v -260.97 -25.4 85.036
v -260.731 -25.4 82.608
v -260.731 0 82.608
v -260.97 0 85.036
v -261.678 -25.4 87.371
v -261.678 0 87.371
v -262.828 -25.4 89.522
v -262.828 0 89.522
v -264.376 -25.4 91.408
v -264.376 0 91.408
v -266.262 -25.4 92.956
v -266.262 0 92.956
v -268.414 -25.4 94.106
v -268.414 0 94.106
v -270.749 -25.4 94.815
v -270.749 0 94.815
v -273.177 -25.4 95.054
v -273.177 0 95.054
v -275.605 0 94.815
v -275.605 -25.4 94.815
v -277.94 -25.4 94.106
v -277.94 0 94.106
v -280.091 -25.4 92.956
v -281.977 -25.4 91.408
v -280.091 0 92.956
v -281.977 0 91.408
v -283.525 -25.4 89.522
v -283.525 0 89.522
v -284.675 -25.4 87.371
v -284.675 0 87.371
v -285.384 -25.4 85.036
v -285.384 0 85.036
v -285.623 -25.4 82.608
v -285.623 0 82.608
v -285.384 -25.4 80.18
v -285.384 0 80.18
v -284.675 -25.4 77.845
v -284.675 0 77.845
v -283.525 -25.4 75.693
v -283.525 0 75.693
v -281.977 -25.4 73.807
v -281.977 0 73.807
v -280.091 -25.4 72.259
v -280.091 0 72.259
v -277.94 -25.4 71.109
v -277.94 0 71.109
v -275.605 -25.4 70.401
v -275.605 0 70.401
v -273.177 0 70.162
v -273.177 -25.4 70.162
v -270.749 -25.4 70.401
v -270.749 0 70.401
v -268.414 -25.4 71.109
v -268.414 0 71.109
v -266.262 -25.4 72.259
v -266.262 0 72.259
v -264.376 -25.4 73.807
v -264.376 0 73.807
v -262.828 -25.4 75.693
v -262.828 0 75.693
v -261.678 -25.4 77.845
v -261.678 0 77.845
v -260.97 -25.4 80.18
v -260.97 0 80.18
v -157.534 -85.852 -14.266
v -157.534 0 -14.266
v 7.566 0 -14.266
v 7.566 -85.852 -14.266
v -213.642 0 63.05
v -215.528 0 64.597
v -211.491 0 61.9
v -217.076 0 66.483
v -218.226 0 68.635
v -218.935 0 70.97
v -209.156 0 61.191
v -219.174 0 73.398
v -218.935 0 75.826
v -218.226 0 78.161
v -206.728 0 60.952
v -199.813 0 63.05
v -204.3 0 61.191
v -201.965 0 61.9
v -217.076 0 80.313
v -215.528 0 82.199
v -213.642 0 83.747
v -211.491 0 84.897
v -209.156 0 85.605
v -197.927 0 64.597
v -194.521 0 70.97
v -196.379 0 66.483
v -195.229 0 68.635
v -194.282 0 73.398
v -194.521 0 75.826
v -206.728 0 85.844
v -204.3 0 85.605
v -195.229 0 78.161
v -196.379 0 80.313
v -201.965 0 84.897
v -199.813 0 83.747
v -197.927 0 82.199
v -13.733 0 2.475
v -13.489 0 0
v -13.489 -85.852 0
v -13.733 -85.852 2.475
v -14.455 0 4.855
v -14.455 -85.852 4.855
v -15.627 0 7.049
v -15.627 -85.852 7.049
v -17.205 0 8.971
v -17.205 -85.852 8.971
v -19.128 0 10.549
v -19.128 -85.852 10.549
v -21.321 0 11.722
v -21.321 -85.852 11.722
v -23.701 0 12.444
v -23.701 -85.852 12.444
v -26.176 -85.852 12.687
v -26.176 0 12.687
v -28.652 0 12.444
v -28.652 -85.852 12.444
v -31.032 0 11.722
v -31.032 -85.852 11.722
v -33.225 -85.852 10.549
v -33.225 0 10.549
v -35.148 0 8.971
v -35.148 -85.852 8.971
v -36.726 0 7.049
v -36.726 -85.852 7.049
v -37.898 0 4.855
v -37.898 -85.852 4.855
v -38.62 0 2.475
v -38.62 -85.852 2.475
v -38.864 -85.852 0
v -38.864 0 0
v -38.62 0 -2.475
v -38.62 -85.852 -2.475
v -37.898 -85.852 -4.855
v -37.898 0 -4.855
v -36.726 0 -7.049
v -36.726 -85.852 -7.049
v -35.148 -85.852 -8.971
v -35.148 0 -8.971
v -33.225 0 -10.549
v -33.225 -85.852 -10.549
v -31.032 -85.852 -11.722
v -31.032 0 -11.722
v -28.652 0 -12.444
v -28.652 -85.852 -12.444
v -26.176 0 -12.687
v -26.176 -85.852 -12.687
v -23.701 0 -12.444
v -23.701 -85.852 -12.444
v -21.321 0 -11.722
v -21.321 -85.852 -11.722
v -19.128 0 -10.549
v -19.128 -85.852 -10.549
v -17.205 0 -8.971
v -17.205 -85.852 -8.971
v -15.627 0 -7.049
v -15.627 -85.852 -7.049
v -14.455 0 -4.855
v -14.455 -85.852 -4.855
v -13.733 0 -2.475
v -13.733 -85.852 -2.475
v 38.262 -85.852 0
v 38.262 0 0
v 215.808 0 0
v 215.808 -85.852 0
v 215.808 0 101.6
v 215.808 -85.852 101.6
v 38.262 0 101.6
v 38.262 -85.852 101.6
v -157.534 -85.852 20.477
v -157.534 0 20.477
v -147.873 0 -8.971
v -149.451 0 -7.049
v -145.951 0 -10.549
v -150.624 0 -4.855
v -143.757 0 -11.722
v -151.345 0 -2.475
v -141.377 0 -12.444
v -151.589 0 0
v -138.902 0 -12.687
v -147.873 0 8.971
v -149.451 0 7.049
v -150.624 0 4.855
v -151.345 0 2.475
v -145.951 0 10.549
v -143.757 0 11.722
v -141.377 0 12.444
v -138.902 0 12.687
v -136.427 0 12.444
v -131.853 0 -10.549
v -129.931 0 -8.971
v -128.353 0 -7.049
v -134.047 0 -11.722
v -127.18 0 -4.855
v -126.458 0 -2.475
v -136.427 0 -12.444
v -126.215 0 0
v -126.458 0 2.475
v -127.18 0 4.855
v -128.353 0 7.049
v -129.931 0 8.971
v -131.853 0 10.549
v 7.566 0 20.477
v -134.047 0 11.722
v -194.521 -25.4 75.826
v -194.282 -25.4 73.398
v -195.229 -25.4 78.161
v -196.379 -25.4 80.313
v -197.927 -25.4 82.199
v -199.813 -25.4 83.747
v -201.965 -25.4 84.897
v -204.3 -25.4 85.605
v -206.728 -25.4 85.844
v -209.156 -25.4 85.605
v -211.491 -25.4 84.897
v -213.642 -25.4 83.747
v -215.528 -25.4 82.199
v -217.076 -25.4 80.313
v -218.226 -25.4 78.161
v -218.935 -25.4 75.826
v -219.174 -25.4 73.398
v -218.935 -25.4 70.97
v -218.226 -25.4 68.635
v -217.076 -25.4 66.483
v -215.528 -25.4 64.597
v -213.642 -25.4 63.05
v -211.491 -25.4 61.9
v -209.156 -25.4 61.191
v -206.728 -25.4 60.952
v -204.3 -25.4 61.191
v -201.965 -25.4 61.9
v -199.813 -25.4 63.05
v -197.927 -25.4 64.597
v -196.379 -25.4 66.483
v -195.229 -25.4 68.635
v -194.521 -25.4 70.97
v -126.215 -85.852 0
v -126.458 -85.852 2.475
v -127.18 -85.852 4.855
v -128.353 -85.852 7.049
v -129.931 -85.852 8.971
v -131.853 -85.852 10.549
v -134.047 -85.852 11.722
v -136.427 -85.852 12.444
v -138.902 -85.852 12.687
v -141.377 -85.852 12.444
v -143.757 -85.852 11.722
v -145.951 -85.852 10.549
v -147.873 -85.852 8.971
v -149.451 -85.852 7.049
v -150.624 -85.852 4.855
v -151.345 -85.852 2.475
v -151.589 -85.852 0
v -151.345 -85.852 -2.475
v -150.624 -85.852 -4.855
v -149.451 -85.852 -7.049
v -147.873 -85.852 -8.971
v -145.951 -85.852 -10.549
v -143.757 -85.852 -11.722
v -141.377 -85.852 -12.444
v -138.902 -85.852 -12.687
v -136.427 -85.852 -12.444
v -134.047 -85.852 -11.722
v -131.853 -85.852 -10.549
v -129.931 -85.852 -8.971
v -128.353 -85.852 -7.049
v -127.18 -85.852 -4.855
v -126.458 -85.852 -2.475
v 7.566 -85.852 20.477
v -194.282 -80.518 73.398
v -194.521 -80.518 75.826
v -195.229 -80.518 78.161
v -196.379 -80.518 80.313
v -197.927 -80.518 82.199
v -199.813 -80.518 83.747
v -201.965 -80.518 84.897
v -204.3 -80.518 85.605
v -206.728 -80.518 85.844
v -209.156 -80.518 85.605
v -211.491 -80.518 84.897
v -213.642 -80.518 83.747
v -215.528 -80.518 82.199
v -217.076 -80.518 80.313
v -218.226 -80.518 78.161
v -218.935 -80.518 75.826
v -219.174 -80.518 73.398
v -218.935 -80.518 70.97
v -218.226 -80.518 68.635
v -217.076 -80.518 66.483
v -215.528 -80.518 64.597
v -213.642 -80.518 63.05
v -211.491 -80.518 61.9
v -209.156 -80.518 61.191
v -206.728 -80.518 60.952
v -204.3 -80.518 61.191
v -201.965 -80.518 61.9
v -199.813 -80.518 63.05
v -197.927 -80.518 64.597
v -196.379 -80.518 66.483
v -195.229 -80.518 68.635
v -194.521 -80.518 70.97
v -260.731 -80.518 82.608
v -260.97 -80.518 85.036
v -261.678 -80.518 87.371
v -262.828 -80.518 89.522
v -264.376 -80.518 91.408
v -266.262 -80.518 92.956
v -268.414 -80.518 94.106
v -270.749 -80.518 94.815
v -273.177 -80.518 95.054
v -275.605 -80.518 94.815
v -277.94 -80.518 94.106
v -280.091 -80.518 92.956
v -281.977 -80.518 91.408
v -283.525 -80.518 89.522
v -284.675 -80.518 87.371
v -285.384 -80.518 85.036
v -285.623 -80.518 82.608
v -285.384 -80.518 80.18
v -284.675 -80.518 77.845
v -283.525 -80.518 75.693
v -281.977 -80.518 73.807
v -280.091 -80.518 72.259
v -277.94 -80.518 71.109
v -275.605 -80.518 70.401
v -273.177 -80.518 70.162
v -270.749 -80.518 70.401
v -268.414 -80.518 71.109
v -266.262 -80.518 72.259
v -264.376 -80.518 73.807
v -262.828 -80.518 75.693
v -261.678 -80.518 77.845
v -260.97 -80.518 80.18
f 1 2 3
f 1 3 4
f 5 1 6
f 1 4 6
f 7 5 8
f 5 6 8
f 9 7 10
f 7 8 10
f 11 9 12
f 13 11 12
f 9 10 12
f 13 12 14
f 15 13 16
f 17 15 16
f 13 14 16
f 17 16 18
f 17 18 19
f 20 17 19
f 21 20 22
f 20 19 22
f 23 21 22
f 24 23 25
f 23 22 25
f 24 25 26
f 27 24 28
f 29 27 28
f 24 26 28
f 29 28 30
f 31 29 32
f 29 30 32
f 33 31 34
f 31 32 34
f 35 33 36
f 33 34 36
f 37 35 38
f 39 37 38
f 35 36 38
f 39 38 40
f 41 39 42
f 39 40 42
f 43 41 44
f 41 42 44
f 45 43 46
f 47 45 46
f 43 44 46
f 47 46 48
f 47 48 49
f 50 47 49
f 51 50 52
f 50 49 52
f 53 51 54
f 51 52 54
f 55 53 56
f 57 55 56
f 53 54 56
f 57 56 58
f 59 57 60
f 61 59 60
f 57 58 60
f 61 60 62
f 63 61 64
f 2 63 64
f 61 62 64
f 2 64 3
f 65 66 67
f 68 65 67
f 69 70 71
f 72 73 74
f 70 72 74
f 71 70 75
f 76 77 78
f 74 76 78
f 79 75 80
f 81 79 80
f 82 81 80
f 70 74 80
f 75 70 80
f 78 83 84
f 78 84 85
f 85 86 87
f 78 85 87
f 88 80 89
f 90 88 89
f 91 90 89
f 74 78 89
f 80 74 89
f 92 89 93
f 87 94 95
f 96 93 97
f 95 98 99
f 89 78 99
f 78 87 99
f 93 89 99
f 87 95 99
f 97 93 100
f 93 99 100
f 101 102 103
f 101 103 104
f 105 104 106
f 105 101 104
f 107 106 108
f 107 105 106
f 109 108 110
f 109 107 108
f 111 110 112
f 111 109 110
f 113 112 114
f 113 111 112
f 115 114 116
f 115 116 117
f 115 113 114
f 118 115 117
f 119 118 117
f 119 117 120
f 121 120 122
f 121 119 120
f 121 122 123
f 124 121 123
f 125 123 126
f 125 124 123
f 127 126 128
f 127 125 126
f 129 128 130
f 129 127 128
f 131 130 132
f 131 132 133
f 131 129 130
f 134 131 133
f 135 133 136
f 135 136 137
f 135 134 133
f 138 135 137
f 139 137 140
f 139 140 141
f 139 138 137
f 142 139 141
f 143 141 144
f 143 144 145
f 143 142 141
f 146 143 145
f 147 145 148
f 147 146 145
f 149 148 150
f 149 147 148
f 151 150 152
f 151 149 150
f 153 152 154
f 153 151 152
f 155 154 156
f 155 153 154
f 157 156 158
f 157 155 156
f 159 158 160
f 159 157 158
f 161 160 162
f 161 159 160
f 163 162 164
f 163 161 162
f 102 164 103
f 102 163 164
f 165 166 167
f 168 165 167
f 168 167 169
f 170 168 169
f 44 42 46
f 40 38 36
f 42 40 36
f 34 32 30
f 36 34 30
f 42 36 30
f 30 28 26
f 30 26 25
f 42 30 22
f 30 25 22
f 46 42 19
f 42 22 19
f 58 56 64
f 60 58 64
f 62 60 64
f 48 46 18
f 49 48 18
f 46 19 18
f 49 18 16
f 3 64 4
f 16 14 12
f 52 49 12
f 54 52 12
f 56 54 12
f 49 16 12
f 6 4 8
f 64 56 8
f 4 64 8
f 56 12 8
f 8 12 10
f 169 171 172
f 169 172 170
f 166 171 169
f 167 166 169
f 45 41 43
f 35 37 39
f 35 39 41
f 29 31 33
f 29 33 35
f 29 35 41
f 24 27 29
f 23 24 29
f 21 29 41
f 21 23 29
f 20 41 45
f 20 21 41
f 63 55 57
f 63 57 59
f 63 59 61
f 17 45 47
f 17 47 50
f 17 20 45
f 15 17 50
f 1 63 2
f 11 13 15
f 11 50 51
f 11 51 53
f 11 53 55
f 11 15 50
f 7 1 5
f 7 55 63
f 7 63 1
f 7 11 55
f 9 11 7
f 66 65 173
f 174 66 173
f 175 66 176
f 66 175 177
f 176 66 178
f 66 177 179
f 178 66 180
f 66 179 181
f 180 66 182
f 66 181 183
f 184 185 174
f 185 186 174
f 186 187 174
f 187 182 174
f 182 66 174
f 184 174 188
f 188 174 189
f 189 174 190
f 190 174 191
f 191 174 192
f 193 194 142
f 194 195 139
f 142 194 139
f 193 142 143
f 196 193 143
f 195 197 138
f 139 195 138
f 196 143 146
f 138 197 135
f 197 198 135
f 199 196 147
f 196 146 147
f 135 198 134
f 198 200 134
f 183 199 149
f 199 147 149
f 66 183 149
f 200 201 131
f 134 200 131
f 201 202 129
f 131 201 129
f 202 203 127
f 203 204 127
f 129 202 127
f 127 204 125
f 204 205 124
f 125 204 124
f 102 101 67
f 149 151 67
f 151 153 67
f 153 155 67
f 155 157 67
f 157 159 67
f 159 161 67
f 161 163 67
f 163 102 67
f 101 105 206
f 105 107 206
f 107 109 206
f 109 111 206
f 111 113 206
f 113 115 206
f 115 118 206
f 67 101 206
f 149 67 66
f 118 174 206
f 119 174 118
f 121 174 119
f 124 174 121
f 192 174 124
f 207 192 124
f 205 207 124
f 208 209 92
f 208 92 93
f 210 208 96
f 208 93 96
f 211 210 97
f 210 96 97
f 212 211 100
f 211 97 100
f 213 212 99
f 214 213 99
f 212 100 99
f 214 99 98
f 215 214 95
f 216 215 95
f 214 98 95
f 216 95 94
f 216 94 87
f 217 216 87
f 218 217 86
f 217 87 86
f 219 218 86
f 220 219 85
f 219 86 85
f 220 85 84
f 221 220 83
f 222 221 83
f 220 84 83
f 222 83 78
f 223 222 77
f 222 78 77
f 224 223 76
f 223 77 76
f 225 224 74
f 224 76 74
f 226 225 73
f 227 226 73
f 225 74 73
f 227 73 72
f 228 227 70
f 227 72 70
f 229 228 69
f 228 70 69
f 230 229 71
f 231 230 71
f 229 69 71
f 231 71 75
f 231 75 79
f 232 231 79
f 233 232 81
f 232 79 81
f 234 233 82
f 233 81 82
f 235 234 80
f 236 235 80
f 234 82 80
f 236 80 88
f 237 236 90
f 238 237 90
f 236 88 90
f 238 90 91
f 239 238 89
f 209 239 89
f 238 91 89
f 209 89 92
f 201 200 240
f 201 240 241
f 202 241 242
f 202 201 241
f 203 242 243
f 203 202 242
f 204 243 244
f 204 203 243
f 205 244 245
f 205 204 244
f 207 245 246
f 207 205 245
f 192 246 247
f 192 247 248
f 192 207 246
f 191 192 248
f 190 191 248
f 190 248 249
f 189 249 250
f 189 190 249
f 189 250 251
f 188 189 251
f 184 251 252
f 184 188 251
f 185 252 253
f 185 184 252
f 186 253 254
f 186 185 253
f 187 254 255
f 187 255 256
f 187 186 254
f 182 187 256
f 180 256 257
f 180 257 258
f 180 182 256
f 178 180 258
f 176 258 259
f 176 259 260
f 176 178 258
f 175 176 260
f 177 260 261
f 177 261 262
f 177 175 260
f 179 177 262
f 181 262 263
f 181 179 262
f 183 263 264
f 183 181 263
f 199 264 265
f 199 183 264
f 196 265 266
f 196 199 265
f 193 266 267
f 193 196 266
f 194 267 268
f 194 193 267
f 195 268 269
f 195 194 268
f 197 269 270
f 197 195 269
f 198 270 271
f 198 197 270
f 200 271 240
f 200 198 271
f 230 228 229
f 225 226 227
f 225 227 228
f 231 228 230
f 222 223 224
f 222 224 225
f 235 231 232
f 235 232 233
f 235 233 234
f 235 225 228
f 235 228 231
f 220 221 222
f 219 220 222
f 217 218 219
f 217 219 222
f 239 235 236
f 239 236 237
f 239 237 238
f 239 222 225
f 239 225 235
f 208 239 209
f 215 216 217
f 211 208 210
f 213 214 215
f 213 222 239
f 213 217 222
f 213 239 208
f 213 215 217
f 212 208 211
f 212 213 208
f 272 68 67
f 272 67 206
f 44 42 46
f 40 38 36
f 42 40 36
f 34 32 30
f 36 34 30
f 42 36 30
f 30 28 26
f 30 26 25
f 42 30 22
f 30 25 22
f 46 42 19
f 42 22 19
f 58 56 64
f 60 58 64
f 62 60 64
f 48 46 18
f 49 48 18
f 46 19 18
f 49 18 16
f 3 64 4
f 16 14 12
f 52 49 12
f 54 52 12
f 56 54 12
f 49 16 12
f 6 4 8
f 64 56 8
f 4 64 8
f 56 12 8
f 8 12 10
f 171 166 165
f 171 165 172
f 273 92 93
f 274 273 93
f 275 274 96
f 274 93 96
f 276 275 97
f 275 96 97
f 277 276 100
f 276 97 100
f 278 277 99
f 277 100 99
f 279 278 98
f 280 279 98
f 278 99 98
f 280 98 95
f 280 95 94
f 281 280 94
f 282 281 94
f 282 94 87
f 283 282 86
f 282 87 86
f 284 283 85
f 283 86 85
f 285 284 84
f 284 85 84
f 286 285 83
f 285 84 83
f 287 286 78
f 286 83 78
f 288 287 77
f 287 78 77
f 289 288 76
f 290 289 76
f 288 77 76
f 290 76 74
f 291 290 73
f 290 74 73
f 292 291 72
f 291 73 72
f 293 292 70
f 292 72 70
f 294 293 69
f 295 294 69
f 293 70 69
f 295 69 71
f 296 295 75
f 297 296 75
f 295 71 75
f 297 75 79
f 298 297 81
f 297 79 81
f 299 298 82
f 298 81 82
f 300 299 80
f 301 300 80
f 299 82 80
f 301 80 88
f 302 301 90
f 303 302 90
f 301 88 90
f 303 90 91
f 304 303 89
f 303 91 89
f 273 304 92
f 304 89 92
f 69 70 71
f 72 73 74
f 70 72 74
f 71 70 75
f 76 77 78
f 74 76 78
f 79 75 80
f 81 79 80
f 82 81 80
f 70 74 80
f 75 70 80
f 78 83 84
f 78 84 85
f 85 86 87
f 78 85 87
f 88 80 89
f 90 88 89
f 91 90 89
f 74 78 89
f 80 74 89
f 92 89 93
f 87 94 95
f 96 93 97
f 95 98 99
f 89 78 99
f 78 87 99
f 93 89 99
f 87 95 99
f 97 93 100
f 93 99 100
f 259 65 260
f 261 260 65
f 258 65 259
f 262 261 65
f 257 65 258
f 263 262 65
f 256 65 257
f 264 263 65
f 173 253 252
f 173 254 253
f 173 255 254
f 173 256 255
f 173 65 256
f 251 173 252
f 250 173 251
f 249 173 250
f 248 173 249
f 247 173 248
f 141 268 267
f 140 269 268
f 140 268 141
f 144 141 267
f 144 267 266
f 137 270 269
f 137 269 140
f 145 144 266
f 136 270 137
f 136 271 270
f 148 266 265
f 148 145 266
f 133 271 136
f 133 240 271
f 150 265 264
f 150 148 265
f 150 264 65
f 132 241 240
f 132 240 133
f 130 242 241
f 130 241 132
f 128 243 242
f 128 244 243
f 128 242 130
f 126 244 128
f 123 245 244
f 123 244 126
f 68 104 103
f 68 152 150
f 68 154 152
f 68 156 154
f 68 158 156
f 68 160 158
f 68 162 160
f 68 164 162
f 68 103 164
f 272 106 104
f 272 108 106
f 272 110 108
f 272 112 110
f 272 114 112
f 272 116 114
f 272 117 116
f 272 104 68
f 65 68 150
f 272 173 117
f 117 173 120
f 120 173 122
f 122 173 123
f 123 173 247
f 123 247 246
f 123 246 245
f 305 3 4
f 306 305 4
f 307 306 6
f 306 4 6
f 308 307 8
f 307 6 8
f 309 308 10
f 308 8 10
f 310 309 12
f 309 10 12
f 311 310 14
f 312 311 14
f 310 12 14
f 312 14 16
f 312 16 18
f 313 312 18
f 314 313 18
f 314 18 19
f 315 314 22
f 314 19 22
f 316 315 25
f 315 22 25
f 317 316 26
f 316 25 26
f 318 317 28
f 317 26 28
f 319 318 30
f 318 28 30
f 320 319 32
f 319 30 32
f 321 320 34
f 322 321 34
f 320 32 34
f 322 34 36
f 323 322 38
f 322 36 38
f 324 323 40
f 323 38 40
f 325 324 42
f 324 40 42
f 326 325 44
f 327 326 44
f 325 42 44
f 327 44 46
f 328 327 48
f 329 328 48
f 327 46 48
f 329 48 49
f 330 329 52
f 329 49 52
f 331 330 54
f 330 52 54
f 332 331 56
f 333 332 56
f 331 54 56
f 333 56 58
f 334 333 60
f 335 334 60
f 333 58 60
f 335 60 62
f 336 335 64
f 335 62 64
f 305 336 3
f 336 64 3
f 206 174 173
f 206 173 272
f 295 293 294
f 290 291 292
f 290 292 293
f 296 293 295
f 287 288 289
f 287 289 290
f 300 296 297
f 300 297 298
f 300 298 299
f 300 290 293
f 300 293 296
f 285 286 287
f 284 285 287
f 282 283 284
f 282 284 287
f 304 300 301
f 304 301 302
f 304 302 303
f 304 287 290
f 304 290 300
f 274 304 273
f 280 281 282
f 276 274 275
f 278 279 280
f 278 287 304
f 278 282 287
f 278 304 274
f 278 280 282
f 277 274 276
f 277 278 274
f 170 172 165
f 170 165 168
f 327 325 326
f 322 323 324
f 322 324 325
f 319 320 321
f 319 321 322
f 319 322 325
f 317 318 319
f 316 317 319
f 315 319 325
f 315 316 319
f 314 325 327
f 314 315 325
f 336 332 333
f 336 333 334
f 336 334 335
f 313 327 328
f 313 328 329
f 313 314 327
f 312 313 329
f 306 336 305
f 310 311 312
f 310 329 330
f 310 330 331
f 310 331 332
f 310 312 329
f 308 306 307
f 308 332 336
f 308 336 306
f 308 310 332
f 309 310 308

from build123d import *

# Parameters (mm, degrees)
F0_W     = 165.1
F0_H     = 34.742784
F0_R     = 12.6873
F0_W_2   = 177.546
F0_H_2   = 101.6
F1_DEPTH = 85.852
F2_R     = 12.446
F3_DEPTH = 80.518
F4_DEPTH = 25.4


with BuildPart() as f1:
    # F0 (on Front) → F1 (new body)
    with BuildSketch(Plane.XZ):
        with Locations((-74.984297, 3.105855)):
            Rectangle(F0_W, F0_H)
        with Locations((-138.901979, 0)):
            Circle(F0_R, mode=Mode.SUBTRACT)
        with Locations((-26.176445, 0)):
            Circle(F0_R, mode=Mode.SUBTRACT)
        with Locations((127.035229, 50.8)):
            Rectangle(F0_W_2, F0_H_2)
    extrude(amount=F1_DEPTH)


with BuildPart() as f3:
    # F2 (on Front) → F3 (new body)
    with BuildSketch(Plane.XZ):
        with Locations((-206.727702, 73.398108)):
            Circle(F2_R)
        with Locations((-273.17673, 82.607768)):
            Circle(F2_R)
    extrude(amount=F3_DEPTH)


with BuildPart() as f4:
    # F2 (on Front) → F4 (new body)
    with BuildSketch(Plane.XZ):
        with Locations((-206.727702, 73.398108)):
            Circle(F2_R)
        with Locations((-273.17673, 82.607768)):
            Circle(F2_R)
    extrude(amount=F4_DEPTH)


solid = Compound([f1.part, f3.part, f4.part])
